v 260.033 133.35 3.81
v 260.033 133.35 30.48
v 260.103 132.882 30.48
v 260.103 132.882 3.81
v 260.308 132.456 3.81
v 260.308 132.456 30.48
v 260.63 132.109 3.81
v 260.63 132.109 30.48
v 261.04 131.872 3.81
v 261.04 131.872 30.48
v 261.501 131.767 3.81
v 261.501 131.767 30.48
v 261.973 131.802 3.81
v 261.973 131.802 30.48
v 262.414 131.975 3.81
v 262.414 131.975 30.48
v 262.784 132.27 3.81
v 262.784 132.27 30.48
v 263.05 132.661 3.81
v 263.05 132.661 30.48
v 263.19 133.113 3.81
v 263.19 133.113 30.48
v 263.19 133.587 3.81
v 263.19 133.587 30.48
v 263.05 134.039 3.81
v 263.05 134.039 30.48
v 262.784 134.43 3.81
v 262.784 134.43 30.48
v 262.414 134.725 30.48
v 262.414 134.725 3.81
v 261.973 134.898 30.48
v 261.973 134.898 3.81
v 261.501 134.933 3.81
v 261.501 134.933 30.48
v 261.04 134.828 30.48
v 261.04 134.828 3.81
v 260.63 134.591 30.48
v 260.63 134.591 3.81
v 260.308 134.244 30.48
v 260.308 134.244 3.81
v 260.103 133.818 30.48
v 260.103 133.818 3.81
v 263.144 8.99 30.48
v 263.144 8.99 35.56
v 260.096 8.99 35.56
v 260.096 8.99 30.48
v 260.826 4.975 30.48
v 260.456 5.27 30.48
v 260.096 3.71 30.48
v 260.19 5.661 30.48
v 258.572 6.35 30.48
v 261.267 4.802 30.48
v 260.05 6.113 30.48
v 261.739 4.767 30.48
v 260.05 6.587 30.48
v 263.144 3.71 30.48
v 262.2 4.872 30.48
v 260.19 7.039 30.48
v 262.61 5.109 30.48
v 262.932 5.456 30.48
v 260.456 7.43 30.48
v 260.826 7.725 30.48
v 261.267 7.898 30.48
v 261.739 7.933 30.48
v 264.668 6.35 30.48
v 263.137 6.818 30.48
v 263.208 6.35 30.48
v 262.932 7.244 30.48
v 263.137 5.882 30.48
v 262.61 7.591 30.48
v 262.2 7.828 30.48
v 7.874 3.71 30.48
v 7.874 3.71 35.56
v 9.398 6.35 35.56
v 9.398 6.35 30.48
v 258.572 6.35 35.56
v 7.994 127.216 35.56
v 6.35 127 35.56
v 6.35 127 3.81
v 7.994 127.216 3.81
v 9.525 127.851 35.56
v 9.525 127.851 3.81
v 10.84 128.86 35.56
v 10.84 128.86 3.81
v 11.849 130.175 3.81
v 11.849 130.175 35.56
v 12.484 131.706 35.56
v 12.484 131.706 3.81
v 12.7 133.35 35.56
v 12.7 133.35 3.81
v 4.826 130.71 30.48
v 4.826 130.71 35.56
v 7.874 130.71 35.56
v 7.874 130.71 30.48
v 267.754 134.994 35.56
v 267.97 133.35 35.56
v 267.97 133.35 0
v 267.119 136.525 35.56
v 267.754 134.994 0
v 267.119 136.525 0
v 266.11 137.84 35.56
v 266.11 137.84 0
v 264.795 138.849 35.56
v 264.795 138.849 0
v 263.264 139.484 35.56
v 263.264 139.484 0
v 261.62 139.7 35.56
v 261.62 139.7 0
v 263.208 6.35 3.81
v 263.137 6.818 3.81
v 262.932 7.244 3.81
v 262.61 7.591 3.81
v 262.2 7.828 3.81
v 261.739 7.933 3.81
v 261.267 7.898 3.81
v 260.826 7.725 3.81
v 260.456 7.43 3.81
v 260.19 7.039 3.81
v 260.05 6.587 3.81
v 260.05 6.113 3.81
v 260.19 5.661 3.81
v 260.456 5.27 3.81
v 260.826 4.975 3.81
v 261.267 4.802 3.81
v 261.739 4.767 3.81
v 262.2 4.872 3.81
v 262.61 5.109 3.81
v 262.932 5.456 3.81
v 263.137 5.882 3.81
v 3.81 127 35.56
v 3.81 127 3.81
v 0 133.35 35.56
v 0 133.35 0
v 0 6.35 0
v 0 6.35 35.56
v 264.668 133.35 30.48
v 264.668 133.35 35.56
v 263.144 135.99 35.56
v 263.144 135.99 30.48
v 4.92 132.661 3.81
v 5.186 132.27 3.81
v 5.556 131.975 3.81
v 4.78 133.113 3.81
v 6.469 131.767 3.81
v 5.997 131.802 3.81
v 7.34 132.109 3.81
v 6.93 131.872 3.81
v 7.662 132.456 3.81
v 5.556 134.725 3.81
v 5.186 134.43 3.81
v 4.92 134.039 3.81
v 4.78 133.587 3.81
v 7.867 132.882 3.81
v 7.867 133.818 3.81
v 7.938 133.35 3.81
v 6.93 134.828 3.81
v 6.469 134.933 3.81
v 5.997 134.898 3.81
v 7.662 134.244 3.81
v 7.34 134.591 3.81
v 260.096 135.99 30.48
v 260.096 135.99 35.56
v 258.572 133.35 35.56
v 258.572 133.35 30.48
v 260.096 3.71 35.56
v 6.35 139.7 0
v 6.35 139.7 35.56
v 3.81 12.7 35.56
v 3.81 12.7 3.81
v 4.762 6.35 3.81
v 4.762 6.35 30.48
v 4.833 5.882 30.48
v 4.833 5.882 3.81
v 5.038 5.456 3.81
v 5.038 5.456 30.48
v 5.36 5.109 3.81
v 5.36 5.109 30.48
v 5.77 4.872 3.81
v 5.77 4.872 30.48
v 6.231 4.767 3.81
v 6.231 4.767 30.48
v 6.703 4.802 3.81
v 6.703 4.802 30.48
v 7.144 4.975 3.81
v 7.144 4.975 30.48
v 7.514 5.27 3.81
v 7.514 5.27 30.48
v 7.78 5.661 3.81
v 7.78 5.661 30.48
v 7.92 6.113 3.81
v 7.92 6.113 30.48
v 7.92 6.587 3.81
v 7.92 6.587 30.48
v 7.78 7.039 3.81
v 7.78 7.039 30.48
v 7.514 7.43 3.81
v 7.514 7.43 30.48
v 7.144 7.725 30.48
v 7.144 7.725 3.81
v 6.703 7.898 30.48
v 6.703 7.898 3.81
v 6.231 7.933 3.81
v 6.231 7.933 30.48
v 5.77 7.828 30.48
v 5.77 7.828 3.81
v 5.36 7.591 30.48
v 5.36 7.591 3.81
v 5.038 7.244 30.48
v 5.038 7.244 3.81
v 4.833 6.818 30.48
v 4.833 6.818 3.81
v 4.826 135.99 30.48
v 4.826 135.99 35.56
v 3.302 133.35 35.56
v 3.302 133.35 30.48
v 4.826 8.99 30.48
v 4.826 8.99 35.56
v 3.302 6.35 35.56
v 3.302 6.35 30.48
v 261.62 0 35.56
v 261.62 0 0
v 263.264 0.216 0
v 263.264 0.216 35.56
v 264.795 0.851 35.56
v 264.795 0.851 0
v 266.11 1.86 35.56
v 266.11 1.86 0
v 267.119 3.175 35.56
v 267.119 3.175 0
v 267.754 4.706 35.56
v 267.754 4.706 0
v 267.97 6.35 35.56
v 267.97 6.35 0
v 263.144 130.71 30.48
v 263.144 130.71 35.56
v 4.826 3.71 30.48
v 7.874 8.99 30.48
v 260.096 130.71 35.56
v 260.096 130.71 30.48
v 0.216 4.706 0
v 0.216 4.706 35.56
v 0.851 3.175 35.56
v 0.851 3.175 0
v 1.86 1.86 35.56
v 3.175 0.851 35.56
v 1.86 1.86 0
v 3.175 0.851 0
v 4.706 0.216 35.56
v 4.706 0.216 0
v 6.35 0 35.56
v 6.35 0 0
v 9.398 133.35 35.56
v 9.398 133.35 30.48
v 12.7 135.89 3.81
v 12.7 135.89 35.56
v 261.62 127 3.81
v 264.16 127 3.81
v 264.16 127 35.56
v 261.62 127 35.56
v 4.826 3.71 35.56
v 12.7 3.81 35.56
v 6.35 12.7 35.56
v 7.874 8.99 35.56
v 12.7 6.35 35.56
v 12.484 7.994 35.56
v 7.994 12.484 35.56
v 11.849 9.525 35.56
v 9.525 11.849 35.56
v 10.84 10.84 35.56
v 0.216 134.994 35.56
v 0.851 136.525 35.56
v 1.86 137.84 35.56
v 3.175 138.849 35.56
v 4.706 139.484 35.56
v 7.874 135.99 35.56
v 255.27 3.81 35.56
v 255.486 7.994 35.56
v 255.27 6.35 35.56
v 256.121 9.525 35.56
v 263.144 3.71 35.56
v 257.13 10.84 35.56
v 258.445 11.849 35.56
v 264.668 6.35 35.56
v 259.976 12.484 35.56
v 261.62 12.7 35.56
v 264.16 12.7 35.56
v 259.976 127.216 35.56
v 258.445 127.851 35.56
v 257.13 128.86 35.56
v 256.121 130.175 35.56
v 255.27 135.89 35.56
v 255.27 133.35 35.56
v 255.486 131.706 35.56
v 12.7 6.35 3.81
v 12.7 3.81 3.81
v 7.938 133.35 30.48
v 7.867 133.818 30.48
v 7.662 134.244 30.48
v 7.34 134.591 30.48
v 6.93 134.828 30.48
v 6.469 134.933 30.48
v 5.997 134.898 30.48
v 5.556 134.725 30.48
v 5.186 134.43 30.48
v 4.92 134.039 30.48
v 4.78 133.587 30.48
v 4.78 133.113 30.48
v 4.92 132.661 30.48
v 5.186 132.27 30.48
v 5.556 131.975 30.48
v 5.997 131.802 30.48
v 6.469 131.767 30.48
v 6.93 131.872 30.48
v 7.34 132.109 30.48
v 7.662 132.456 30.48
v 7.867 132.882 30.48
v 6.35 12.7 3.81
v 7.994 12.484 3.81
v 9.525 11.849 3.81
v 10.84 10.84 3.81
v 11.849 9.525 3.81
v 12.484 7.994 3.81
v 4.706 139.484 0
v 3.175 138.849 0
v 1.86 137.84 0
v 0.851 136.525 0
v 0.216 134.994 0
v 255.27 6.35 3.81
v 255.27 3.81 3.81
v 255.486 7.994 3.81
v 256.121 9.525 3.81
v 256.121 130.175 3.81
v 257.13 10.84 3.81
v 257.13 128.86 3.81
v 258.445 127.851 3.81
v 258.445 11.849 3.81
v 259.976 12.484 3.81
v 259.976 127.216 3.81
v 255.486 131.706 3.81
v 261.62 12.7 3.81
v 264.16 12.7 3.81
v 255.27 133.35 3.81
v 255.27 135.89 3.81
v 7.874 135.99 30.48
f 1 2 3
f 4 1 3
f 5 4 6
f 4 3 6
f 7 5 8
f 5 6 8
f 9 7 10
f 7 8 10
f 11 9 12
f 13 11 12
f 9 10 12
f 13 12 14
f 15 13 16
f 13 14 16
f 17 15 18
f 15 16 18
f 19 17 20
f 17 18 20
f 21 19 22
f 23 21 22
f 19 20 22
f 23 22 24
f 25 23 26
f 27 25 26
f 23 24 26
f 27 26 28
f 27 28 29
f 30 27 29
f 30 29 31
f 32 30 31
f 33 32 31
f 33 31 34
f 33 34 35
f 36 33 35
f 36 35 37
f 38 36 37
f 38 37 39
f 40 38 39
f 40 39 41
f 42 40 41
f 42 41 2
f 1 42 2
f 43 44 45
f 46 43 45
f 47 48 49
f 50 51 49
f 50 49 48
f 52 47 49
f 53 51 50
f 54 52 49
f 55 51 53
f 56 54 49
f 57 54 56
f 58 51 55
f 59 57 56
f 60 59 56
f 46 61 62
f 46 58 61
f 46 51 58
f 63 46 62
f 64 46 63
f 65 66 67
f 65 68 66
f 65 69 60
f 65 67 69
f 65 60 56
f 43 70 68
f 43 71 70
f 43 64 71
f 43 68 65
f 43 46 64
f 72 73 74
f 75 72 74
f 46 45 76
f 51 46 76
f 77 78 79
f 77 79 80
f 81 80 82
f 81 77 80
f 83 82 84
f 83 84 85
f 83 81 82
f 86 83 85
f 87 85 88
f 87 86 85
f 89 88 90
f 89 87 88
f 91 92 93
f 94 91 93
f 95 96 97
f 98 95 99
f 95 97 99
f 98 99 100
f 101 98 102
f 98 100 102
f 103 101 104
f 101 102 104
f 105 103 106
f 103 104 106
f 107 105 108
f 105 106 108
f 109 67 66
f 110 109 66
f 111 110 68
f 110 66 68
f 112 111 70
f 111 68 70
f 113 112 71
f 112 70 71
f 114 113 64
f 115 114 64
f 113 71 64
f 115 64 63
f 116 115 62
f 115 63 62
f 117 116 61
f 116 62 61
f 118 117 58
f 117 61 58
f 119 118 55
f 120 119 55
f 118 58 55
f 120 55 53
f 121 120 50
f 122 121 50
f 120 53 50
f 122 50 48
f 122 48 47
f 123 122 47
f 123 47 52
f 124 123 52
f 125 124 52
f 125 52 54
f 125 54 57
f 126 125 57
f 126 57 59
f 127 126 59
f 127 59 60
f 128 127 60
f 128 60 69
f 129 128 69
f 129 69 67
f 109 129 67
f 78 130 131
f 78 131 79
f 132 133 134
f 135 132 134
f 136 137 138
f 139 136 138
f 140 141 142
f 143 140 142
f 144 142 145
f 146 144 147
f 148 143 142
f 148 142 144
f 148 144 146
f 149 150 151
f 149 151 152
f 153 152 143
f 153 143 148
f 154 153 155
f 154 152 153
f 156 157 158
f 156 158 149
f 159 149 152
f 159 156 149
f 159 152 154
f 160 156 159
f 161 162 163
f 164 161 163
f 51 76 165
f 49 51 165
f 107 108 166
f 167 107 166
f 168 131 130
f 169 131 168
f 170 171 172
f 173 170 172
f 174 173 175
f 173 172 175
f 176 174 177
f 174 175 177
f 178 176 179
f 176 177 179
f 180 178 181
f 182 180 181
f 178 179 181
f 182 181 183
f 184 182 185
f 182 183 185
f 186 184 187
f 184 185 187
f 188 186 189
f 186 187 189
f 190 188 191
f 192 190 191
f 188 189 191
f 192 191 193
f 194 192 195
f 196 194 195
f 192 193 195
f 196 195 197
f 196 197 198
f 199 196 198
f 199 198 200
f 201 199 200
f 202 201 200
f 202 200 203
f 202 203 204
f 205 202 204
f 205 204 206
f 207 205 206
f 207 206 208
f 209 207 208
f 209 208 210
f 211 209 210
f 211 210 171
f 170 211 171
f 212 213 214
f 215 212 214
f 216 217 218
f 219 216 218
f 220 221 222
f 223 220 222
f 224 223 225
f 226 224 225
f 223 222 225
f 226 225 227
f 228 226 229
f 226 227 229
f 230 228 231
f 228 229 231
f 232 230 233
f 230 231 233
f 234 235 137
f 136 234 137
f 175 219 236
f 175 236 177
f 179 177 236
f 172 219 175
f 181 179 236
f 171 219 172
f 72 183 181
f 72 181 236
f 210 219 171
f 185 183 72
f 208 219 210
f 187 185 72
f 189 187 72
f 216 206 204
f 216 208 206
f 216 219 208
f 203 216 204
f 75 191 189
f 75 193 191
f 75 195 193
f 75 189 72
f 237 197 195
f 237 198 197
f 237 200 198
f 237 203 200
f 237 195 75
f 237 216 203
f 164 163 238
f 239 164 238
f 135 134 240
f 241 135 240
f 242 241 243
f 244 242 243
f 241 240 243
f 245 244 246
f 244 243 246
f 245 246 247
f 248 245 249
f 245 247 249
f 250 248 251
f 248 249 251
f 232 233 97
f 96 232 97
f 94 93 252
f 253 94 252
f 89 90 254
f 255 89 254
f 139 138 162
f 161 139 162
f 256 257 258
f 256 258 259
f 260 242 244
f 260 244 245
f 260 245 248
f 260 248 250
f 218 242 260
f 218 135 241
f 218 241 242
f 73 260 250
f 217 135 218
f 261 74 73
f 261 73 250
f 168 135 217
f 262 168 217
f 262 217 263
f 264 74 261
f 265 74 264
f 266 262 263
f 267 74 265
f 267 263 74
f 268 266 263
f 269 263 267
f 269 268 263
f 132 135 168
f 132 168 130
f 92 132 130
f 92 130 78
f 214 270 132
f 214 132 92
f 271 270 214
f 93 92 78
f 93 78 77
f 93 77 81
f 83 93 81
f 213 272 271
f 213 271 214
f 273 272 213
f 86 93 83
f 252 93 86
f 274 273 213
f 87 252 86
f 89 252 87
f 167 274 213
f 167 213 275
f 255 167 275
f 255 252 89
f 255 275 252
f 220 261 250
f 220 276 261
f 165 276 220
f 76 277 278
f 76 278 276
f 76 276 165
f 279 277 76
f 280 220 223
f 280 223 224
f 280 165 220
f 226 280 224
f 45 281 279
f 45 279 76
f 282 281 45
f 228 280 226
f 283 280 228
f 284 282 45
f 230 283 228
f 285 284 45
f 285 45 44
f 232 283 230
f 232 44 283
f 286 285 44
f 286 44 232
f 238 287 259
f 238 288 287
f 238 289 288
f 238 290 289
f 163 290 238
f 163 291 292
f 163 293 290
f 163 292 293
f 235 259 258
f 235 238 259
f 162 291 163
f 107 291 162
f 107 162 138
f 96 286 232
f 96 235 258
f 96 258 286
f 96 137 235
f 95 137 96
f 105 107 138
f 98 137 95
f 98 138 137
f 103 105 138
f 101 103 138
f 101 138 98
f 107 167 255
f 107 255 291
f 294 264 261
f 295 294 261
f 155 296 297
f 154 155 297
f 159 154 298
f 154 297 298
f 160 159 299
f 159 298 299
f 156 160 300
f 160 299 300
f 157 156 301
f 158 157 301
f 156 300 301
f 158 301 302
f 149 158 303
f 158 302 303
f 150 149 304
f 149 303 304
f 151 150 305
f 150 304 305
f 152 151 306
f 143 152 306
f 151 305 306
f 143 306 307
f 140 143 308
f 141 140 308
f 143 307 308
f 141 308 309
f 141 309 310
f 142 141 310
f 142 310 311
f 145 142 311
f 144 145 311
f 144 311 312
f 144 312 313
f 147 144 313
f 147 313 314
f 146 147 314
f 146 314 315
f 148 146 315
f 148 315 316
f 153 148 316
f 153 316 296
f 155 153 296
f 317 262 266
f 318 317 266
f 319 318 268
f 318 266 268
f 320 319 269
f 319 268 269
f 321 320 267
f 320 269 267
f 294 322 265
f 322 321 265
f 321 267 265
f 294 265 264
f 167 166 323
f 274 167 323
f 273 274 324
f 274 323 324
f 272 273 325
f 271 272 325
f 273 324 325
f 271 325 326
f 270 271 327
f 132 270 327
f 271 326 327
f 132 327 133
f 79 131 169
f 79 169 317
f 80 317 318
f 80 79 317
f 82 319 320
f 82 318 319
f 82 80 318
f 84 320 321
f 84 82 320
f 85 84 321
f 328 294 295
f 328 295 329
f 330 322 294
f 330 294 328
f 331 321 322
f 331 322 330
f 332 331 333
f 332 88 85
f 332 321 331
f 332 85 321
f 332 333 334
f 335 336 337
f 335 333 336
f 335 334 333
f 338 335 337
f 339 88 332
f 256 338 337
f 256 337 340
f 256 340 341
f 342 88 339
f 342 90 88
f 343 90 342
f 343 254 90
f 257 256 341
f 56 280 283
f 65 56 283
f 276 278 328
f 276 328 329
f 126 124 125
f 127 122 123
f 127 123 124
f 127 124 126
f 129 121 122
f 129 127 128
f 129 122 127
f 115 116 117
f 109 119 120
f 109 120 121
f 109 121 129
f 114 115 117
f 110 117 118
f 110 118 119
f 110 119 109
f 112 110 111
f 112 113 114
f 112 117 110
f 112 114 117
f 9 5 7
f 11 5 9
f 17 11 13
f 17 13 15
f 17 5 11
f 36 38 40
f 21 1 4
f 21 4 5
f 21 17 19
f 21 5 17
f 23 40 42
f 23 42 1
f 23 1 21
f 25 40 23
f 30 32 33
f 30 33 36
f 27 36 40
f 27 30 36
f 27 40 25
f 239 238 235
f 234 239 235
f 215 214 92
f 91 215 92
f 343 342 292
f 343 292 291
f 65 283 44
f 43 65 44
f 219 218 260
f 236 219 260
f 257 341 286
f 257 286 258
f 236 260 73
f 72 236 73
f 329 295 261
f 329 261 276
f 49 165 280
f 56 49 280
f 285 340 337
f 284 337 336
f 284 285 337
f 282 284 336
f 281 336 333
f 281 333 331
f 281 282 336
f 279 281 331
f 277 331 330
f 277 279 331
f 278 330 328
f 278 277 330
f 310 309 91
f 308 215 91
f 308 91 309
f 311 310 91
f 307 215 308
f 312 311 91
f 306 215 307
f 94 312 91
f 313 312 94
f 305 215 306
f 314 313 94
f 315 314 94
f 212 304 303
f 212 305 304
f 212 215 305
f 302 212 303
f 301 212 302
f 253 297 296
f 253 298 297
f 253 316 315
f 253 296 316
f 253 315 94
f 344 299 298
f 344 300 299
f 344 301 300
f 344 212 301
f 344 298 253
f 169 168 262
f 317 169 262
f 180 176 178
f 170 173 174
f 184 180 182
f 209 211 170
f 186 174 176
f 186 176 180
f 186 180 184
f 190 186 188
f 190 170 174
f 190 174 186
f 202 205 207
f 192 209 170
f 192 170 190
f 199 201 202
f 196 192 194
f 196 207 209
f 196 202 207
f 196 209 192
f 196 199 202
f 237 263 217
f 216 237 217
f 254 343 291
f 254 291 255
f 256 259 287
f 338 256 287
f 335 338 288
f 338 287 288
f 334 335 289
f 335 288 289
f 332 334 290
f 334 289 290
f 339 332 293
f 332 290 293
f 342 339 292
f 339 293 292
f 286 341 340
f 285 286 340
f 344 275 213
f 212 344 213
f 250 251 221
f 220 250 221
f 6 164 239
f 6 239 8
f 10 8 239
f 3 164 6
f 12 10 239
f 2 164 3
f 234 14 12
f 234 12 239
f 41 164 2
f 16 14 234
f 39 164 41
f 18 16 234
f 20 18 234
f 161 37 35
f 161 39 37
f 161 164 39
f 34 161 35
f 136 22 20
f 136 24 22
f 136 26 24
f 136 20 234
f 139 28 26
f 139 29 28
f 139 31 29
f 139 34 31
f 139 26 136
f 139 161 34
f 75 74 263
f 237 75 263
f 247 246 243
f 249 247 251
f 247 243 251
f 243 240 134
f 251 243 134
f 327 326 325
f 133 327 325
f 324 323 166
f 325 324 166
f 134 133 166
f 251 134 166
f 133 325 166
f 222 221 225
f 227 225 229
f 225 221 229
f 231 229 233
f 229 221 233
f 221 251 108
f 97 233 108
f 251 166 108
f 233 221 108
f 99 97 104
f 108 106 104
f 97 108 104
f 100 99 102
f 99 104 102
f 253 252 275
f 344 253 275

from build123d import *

# Parameters (mm, degrees)
BOSS_EXTRUDE1_DEPTH = 35.56
SHELL1_T            = -3.81
BOSS_EXTRUDE2_REACH = 306.284
SKETCH2_R           = 1.5875
CUT_EXTRUDE1_DEPTH  = 5.08


with BuildPart() as part:
    # Sketch1 → Boss-Extrude1 (new body)
    with BuildSketch(Plane.XY):
        with BuildLine():
            Line((6.35, 0), (261.62, 0))
            ThreePointArc((261.62, 0), (266.110128061, 1.859871939), (267.97, 6.35))
            Line((267.97, 6.35), (267.97, 133.35))
            ThreePointArc((267.97, 133.35), (266.110128061, 137.840128061), (261.62, 139.7))
            Line((261.62, 139.7), (6.35, 139.7))
            ThreePointArc((6.35, 139.7), (1.859871939, 137.840128061), (0, 133.35))
            Line((0, 133.35), (0, 6.35))
            ThreePointArc((0, 6.35), (1.859871939, 1.859871939), (6.35, 0))
        make_face()
    extrude(amount=BOSS_EXTRUDE1_DEPTH)

    # Shell1
    shell1_openings = [part.faces().sort_by_distance(p)[0] for p in [
        (133.985, 69.85, 35.56),
    ]]
    offset(amount=SHELL1_T, openings=shell1_openings, kind=Kind.INTERSECTION)

    # Sketch2 → Boss-Extrude2 (add, up to next)
    with BuildSketch(Plane.XY.offset(35.56), mode=Mode.PRIVATE) as boss_extrude2_sk1:
        with BuildLine():
            Line((255.27, 139.7), (261.62, 139.7))
            ThreePointArc((261.62, 139.7), (266.110128061, 137.840128061), (267.97, 133.35))
            Line((267.97, 133.35), (267.97, 127))
            Line((267.97, 127), (261.62, 127))
            ThreePointArc((261.62, 127), (257.129871939, 128.859871939), (255.27, 133.35))
            Line((255.27, 133.35), (255.27, 139.7))
        make_face()
        with Locations(Location((261.62, 133.35, 0), (0, 0, 180))):
            Circle(SKETCH2_R, mode=Mode.SUBTRACT)
    boss_extrude2_tool1 = extrude(boss_extrude2_sk1.sketch, amount=-BOSS_EXTRUDE2_REACH, mode=Mode.PRIVATE) - part.part
    # Sketch2 → Boss-Extrude2 (add, up to next)
    with BuildSketch(Plane.XY.offset(35.56), mode=Mode.PRIVATE) as boss_extrude2_sk2:
        with BuildLine():
            Line((12.7, 133.35), (12.7, 139.7))
            Line((12.7, 139.7), (6.35, 139.7))
            ThreePointArc((6.35, 139.7), (1.859871939, 137.840128061), (0, 133.35))
            Line((0, 133.35), (0, 127))
            Line((0, 127), (6.35, 127))
            ThreePointArc((6.35, 127), (10.840128061, 128.859871939), (12.7, 133.35))
        make_face()
        with Locations((6.35, 133.35)):
            Circle(SKETCH2_R, mode=Mode.SUBTRACT)
    boss_extrude2_tool2 = extrude(boss_extrude2_sk2.sketch, amount=-BOSS_EXTRUDE2_REACH, mode=Mode.PRIVATE) - part.part
    # Sketch2 → Boss-Extrude2 (add, up to next)
    with BuildSketch(Plane.XY.offset(35.56), mode=Mode.PRIVATE) as boss_extrude2_sk3:
        with BuildLine():
            Line((12.7, 0), (6.35, 0))
            ThreePointArc((6.35, 0), (1.859871939, 1.859871939), (0, 6.35))
            Line((0, 6.35), (0, 12.7))
            Line((0, 12.7), (6.35, 12.7))
            ThreePointArc((6.35, 12.7), (10.840128061, 10.840128061), (12.7, 6.35))
            Line((12.7, 6.35), (12.7, 0))
        make_face()
        with Locations(Location((6.35, 6.35, 0), (0, 0, 180))):
            Circle(SKETCH2_R, mode=Mode.SUBTRACT)
    boss_extrude2_tool3 = extrude(boss_extrude2_sk3.sketch, amount=-BOSS_EXTRUDE2_REACH, mode=Mode.PRIVATE) - part.part
    # Sketch2 → Boss-Extrude2 (add, up to next)
    with BuildSketch(Plane.XY.offset(35.56), mode=Mode.PRIVATE) as boss_extrude2_sk4:
        with BuildLine():
            Line((255.27, 6.35), (255.27, 0))
            Line((255.27, 0), (261.62, 0))
            ThreePointArc((261.62, 0), (266.110128061, 1.859871939), (267.97, 6.35))
            Line((267.97, 6.35), (267.97, 12.7))
            Line((267.97, 12.7), (261.62, 12.7))
            ThreePointArc((261.62, 12.7), (257.129871939, 10.840128061), (255.27, 6.35))
        make_face()
        with Locations((261.62, 6.35)):
            Circle(SKETCH2_R, mode=Mode.SUBTRACT)
    boss_extrude2_tool4 = extrude(boss_extrude2_sk4.sketch, amount=-BOSS_EXTRUDE2_REACH, mode=Mode.PRIVATE) - part.part
    add(boss_extrude2_tool1.solids().sort_by_distance((258.445, 139.520395, 35.56))[0])
    add(boss_extrude2_tool2.solids().sort_by_distance((12.520395, 136.525, 35.56))[0])
    add(boss_extrude2_tool3.solids().sort_by_distance((12.520395, 3.175, 35.56))[0])
    add(boss_extrude2_tool4.solids().sort_by_distance((257.256872, 10.713128, 35.56))[0])

    # Sketch3 → Cut-Extrude1 (cut)
    with BuildSketch(Plane.XY.offset(35.56)):
        Polygon((9.398, 133.35), (7.874, 135.989645431), (4.826, 135.989645431), (3.302, 133.35), (4.826, 130.710354569), (7.874, 130.710354569), align=None)
        Polygon((258.572, 133.35), (260.096, 130.710354569), (263.144, 130.710354569), (264.668, 133.35), (263.144, 135.989645431), (260.096, 135.989645431), align=None)
        Polygon((264.668, 6.35), (263.144, 8.989645431), (260.096, 8.989645431), (258.572, 6.35), (260.096, 3.710354569), (263.144, 3.710354569), align=None)
        Polygon((9.398, 6.35), (7.874, 8.989645431), (4.826, 8.989645431), (3.302, 6.35), (4.826, 3.710354569), (7.874, 3.710354569), align=None)
    extrude(amount=-CUT_EXTRUDE1_DEPTH, mode=Mode.SUBTRACT)


solid = part.part
